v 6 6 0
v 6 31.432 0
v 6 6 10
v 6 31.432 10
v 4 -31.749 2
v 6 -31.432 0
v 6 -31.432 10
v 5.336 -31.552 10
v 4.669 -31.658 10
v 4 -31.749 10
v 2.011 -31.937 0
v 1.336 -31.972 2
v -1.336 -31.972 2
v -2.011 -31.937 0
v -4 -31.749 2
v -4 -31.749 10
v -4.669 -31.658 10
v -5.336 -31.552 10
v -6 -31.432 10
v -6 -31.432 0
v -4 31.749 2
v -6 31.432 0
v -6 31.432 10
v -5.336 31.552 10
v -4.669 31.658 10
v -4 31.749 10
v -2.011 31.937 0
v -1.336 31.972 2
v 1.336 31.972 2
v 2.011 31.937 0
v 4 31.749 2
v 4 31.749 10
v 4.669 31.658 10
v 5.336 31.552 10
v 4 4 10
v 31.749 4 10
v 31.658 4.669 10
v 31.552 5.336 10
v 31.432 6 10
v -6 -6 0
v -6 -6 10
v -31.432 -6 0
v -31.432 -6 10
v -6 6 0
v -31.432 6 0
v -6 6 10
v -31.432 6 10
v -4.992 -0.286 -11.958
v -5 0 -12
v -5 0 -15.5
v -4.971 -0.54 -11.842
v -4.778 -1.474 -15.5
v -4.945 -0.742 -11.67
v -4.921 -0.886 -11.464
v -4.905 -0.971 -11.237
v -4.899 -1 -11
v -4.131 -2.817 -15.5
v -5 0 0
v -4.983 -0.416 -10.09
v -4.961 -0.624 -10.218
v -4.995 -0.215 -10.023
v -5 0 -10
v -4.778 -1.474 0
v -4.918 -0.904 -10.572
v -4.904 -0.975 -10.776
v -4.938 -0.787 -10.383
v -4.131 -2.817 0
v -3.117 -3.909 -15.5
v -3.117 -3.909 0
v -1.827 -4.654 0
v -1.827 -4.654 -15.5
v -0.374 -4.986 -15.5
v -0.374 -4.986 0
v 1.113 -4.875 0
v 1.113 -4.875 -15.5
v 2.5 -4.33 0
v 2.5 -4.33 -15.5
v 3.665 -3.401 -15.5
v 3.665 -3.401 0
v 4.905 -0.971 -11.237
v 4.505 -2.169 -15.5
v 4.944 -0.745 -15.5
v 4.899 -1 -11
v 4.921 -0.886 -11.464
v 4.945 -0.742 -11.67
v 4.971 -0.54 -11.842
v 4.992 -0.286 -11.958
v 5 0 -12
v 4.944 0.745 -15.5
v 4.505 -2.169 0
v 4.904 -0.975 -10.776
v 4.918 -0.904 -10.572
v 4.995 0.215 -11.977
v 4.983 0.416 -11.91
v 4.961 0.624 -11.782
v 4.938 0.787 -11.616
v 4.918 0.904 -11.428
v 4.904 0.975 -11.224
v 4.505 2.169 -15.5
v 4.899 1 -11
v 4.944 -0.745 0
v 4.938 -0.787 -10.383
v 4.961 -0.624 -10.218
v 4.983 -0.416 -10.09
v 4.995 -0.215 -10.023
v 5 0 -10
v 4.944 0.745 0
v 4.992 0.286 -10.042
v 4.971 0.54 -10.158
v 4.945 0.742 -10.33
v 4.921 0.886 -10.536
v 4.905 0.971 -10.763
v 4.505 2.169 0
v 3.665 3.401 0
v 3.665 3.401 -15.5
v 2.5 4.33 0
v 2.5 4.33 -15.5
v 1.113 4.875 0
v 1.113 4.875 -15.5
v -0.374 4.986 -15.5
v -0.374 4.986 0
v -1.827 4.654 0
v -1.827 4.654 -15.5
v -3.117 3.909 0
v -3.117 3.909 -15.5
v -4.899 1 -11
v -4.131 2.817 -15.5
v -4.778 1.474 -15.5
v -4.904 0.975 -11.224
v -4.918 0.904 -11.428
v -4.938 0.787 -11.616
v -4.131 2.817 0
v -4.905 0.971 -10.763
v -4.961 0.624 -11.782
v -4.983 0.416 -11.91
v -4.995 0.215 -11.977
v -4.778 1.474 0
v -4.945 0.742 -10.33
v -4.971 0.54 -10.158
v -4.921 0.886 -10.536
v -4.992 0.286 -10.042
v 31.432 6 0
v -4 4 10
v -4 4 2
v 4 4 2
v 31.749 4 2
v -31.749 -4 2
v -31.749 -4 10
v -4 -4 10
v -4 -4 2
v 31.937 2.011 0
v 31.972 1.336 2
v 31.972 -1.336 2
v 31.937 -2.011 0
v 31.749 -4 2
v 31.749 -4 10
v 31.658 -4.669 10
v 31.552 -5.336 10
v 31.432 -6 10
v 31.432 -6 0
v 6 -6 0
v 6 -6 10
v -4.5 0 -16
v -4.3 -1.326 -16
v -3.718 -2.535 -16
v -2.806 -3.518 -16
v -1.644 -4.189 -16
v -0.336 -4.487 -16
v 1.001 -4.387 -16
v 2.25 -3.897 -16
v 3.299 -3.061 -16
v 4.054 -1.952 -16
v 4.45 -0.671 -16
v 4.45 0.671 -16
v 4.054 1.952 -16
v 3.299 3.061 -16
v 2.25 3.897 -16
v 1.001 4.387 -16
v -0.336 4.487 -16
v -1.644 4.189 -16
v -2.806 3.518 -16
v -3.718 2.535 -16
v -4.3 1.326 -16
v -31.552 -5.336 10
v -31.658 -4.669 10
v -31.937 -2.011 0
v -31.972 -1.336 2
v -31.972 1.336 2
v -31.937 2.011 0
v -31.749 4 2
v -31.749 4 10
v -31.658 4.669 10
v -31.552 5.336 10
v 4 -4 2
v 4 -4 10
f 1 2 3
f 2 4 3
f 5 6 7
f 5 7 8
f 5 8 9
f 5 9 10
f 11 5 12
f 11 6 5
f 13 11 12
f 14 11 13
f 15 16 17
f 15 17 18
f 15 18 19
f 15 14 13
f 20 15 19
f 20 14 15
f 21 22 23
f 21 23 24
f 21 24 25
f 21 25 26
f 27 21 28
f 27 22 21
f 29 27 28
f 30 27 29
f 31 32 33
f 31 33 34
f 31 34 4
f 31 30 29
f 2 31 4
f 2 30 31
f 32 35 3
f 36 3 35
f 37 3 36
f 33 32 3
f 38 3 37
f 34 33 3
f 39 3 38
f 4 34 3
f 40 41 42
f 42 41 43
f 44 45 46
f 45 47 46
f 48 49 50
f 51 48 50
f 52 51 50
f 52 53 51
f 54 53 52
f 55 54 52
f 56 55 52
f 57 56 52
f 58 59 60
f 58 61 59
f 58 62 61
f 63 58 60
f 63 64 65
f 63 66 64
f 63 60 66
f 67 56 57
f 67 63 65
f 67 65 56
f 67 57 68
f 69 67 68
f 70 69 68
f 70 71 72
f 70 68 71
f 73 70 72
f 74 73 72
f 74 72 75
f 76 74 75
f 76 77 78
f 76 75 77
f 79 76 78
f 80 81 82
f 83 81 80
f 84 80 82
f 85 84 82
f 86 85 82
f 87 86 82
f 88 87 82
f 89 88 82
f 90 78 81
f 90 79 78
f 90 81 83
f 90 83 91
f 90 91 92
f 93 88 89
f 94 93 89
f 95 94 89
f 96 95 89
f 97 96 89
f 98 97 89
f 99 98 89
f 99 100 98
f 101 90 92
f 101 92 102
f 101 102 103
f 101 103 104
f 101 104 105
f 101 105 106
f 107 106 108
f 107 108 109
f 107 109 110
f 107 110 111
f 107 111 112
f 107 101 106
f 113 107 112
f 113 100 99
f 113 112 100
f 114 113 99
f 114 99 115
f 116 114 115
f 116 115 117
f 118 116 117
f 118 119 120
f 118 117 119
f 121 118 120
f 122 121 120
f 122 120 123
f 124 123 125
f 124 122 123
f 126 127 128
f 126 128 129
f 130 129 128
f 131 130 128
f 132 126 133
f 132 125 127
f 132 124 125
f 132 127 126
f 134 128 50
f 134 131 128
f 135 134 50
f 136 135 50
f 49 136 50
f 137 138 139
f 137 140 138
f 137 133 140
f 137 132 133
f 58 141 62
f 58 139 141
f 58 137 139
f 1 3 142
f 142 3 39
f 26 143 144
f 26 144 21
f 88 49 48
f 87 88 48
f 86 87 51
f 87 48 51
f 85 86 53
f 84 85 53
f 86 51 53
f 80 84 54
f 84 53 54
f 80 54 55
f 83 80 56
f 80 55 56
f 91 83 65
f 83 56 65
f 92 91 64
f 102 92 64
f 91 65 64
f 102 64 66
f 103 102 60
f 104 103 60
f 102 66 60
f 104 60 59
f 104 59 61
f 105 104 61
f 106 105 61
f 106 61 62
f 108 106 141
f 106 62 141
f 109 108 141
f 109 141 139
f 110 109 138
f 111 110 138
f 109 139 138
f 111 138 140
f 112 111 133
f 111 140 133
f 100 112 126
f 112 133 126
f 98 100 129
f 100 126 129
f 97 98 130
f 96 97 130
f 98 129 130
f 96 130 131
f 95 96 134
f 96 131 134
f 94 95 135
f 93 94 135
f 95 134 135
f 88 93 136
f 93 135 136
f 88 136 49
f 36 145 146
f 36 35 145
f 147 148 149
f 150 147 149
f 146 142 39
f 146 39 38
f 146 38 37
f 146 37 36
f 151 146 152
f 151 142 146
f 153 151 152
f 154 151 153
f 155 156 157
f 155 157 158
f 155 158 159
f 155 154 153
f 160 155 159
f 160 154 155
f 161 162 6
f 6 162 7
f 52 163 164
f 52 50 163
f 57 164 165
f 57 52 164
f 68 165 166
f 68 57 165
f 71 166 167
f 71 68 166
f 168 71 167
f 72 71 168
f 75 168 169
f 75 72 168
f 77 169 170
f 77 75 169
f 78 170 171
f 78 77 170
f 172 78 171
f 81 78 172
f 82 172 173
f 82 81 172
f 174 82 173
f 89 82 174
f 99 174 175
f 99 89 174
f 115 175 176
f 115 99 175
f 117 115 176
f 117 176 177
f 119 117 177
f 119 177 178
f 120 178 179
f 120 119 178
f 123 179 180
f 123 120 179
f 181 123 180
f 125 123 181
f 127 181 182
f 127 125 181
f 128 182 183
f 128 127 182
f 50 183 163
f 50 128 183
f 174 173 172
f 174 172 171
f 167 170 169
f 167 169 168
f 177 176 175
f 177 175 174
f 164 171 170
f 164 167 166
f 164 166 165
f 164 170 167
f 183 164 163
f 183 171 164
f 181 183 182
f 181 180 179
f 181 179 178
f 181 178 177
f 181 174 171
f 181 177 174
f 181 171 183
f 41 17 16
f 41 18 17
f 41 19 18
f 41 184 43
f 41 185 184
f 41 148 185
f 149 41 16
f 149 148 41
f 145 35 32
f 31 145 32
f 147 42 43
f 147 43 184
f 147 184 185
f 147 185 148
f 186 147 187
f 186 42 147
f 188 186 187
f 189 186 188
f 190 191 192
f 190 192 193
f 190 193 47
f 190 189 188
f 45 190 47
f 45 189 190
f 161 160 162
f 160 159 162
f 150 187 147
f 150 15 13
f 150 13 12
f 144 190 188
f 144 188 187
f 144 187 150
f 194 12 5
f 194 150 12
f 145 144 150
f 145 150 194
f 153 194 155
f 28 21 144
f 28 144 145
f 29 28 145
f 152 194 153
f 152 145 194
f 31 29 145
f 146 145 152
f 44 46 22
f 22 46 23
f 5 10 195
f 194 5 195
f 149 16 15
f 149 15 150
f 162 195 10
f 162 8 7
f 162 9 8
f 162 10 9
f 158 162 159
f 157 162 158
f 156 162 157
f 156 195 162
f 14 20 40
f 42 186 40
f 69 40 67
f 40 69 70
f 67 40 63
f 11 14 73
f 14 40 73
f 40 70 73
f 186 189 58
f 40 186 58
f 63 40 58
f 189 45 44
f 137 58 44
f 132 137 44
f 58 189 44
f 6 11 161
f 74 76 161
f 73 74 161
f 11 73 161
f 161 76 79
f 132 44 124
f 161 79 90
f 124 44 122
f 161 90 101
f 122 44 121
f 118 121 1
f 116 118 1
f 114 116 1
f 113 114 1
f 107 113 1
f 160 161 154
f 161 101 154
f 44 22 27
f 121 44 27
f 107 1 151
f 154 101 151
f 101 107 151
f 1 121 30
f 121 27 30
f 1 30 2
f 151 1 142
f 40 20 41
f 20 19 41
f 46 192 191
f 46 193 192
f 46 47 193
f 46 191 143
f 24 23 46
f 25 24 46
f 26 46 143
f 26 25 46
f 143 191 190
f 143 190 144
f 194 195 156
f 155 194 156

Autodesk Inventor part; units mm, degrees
ref_plane "YZ Plane" through (0, 0, 0) normal (1, 0, 0) x (0, 1, 0)
ref_plane "XY Plane" through (0, 0, 0) normal (0, 0, 1) x (1, 0, 0)
sketch "Sketch1" plane through (0, 0, 0) normal (0, 0, 1) x (1, 0, 0)
  circle A0 centre (0, 0) radius 32
  dimension "d0" = 64
extrude "Extrusion1" add sketch "Sketch1" along normal blind 10
sketch "Sketch2" plane through (0, 0, 10) normal (0, 0, 1) x (1, 0, 0)
  circle A0 centre (0, 0) radius 32 projected
  line L0 (-31.4325, 6) -> (-6, 6)
  line L1 (-6, 6) -> (-6, 31.4325)
  dimension "d3" = 6
extrude "Extrusion2" cut sketch "Sketch2" against normal through all contours L1 L0 A0 picked at (-8.4207, 22.185)
pattern_circular "Circular Pattern1" count 4 over 360 about axis through (0, 0, 0) along (0, 0, 1) of "Extrusion2"
sketch "Sketch3" plane through (0, 0, 10) normal (0, 0, 1) x (1, 0, 0)
  arc A0 (-31.4325, 6) -> (-31.4325, -6) centre (0, 0) ccw projected
  arc A1 (31.4325, -6) -> (31.4325, 6) centre (0, 0) ccw projected
  line L0 (-31.749, 4) -> (31.749, 4)
  line L1 (-31.749, -4) -> (31.749, -4)
  dimension "d9" = 8
extrude "Extrusion3" cut sketch "Sketch3" against normal blind 8
pattern_circular "Circular Pattern2" count 2 over 90 about axis through (0, 0, 0) along (0, 0, 1) of "Extrusion3"
sketch "Sketch4" plane through (0, 0, 0) normal (0, 0, -1) x (-1, 0, 0)
  arc A0 (6, 31.4325) -> (-6, 31.4325) centre (0, 0) ccw projected
  circle A1 centre (0, 0) radius 5
  dimension "d15" = 10
extrude "Extrusion4" add sketch "Sketch4" along normal blind 16
chamfer "Chamfer1" distance 0.5 angle 45 1 edges at (5, 0, -16)
hole "Hole1" at (5, 0, -11) direction (-1, 0, 0) diameter 2 end through all
ref_plane "Work Plane1" through (0, 0, -11) normal (0, 0, -1) x (-1, 0, 0)
properties part number "Cross" material "Steel"
